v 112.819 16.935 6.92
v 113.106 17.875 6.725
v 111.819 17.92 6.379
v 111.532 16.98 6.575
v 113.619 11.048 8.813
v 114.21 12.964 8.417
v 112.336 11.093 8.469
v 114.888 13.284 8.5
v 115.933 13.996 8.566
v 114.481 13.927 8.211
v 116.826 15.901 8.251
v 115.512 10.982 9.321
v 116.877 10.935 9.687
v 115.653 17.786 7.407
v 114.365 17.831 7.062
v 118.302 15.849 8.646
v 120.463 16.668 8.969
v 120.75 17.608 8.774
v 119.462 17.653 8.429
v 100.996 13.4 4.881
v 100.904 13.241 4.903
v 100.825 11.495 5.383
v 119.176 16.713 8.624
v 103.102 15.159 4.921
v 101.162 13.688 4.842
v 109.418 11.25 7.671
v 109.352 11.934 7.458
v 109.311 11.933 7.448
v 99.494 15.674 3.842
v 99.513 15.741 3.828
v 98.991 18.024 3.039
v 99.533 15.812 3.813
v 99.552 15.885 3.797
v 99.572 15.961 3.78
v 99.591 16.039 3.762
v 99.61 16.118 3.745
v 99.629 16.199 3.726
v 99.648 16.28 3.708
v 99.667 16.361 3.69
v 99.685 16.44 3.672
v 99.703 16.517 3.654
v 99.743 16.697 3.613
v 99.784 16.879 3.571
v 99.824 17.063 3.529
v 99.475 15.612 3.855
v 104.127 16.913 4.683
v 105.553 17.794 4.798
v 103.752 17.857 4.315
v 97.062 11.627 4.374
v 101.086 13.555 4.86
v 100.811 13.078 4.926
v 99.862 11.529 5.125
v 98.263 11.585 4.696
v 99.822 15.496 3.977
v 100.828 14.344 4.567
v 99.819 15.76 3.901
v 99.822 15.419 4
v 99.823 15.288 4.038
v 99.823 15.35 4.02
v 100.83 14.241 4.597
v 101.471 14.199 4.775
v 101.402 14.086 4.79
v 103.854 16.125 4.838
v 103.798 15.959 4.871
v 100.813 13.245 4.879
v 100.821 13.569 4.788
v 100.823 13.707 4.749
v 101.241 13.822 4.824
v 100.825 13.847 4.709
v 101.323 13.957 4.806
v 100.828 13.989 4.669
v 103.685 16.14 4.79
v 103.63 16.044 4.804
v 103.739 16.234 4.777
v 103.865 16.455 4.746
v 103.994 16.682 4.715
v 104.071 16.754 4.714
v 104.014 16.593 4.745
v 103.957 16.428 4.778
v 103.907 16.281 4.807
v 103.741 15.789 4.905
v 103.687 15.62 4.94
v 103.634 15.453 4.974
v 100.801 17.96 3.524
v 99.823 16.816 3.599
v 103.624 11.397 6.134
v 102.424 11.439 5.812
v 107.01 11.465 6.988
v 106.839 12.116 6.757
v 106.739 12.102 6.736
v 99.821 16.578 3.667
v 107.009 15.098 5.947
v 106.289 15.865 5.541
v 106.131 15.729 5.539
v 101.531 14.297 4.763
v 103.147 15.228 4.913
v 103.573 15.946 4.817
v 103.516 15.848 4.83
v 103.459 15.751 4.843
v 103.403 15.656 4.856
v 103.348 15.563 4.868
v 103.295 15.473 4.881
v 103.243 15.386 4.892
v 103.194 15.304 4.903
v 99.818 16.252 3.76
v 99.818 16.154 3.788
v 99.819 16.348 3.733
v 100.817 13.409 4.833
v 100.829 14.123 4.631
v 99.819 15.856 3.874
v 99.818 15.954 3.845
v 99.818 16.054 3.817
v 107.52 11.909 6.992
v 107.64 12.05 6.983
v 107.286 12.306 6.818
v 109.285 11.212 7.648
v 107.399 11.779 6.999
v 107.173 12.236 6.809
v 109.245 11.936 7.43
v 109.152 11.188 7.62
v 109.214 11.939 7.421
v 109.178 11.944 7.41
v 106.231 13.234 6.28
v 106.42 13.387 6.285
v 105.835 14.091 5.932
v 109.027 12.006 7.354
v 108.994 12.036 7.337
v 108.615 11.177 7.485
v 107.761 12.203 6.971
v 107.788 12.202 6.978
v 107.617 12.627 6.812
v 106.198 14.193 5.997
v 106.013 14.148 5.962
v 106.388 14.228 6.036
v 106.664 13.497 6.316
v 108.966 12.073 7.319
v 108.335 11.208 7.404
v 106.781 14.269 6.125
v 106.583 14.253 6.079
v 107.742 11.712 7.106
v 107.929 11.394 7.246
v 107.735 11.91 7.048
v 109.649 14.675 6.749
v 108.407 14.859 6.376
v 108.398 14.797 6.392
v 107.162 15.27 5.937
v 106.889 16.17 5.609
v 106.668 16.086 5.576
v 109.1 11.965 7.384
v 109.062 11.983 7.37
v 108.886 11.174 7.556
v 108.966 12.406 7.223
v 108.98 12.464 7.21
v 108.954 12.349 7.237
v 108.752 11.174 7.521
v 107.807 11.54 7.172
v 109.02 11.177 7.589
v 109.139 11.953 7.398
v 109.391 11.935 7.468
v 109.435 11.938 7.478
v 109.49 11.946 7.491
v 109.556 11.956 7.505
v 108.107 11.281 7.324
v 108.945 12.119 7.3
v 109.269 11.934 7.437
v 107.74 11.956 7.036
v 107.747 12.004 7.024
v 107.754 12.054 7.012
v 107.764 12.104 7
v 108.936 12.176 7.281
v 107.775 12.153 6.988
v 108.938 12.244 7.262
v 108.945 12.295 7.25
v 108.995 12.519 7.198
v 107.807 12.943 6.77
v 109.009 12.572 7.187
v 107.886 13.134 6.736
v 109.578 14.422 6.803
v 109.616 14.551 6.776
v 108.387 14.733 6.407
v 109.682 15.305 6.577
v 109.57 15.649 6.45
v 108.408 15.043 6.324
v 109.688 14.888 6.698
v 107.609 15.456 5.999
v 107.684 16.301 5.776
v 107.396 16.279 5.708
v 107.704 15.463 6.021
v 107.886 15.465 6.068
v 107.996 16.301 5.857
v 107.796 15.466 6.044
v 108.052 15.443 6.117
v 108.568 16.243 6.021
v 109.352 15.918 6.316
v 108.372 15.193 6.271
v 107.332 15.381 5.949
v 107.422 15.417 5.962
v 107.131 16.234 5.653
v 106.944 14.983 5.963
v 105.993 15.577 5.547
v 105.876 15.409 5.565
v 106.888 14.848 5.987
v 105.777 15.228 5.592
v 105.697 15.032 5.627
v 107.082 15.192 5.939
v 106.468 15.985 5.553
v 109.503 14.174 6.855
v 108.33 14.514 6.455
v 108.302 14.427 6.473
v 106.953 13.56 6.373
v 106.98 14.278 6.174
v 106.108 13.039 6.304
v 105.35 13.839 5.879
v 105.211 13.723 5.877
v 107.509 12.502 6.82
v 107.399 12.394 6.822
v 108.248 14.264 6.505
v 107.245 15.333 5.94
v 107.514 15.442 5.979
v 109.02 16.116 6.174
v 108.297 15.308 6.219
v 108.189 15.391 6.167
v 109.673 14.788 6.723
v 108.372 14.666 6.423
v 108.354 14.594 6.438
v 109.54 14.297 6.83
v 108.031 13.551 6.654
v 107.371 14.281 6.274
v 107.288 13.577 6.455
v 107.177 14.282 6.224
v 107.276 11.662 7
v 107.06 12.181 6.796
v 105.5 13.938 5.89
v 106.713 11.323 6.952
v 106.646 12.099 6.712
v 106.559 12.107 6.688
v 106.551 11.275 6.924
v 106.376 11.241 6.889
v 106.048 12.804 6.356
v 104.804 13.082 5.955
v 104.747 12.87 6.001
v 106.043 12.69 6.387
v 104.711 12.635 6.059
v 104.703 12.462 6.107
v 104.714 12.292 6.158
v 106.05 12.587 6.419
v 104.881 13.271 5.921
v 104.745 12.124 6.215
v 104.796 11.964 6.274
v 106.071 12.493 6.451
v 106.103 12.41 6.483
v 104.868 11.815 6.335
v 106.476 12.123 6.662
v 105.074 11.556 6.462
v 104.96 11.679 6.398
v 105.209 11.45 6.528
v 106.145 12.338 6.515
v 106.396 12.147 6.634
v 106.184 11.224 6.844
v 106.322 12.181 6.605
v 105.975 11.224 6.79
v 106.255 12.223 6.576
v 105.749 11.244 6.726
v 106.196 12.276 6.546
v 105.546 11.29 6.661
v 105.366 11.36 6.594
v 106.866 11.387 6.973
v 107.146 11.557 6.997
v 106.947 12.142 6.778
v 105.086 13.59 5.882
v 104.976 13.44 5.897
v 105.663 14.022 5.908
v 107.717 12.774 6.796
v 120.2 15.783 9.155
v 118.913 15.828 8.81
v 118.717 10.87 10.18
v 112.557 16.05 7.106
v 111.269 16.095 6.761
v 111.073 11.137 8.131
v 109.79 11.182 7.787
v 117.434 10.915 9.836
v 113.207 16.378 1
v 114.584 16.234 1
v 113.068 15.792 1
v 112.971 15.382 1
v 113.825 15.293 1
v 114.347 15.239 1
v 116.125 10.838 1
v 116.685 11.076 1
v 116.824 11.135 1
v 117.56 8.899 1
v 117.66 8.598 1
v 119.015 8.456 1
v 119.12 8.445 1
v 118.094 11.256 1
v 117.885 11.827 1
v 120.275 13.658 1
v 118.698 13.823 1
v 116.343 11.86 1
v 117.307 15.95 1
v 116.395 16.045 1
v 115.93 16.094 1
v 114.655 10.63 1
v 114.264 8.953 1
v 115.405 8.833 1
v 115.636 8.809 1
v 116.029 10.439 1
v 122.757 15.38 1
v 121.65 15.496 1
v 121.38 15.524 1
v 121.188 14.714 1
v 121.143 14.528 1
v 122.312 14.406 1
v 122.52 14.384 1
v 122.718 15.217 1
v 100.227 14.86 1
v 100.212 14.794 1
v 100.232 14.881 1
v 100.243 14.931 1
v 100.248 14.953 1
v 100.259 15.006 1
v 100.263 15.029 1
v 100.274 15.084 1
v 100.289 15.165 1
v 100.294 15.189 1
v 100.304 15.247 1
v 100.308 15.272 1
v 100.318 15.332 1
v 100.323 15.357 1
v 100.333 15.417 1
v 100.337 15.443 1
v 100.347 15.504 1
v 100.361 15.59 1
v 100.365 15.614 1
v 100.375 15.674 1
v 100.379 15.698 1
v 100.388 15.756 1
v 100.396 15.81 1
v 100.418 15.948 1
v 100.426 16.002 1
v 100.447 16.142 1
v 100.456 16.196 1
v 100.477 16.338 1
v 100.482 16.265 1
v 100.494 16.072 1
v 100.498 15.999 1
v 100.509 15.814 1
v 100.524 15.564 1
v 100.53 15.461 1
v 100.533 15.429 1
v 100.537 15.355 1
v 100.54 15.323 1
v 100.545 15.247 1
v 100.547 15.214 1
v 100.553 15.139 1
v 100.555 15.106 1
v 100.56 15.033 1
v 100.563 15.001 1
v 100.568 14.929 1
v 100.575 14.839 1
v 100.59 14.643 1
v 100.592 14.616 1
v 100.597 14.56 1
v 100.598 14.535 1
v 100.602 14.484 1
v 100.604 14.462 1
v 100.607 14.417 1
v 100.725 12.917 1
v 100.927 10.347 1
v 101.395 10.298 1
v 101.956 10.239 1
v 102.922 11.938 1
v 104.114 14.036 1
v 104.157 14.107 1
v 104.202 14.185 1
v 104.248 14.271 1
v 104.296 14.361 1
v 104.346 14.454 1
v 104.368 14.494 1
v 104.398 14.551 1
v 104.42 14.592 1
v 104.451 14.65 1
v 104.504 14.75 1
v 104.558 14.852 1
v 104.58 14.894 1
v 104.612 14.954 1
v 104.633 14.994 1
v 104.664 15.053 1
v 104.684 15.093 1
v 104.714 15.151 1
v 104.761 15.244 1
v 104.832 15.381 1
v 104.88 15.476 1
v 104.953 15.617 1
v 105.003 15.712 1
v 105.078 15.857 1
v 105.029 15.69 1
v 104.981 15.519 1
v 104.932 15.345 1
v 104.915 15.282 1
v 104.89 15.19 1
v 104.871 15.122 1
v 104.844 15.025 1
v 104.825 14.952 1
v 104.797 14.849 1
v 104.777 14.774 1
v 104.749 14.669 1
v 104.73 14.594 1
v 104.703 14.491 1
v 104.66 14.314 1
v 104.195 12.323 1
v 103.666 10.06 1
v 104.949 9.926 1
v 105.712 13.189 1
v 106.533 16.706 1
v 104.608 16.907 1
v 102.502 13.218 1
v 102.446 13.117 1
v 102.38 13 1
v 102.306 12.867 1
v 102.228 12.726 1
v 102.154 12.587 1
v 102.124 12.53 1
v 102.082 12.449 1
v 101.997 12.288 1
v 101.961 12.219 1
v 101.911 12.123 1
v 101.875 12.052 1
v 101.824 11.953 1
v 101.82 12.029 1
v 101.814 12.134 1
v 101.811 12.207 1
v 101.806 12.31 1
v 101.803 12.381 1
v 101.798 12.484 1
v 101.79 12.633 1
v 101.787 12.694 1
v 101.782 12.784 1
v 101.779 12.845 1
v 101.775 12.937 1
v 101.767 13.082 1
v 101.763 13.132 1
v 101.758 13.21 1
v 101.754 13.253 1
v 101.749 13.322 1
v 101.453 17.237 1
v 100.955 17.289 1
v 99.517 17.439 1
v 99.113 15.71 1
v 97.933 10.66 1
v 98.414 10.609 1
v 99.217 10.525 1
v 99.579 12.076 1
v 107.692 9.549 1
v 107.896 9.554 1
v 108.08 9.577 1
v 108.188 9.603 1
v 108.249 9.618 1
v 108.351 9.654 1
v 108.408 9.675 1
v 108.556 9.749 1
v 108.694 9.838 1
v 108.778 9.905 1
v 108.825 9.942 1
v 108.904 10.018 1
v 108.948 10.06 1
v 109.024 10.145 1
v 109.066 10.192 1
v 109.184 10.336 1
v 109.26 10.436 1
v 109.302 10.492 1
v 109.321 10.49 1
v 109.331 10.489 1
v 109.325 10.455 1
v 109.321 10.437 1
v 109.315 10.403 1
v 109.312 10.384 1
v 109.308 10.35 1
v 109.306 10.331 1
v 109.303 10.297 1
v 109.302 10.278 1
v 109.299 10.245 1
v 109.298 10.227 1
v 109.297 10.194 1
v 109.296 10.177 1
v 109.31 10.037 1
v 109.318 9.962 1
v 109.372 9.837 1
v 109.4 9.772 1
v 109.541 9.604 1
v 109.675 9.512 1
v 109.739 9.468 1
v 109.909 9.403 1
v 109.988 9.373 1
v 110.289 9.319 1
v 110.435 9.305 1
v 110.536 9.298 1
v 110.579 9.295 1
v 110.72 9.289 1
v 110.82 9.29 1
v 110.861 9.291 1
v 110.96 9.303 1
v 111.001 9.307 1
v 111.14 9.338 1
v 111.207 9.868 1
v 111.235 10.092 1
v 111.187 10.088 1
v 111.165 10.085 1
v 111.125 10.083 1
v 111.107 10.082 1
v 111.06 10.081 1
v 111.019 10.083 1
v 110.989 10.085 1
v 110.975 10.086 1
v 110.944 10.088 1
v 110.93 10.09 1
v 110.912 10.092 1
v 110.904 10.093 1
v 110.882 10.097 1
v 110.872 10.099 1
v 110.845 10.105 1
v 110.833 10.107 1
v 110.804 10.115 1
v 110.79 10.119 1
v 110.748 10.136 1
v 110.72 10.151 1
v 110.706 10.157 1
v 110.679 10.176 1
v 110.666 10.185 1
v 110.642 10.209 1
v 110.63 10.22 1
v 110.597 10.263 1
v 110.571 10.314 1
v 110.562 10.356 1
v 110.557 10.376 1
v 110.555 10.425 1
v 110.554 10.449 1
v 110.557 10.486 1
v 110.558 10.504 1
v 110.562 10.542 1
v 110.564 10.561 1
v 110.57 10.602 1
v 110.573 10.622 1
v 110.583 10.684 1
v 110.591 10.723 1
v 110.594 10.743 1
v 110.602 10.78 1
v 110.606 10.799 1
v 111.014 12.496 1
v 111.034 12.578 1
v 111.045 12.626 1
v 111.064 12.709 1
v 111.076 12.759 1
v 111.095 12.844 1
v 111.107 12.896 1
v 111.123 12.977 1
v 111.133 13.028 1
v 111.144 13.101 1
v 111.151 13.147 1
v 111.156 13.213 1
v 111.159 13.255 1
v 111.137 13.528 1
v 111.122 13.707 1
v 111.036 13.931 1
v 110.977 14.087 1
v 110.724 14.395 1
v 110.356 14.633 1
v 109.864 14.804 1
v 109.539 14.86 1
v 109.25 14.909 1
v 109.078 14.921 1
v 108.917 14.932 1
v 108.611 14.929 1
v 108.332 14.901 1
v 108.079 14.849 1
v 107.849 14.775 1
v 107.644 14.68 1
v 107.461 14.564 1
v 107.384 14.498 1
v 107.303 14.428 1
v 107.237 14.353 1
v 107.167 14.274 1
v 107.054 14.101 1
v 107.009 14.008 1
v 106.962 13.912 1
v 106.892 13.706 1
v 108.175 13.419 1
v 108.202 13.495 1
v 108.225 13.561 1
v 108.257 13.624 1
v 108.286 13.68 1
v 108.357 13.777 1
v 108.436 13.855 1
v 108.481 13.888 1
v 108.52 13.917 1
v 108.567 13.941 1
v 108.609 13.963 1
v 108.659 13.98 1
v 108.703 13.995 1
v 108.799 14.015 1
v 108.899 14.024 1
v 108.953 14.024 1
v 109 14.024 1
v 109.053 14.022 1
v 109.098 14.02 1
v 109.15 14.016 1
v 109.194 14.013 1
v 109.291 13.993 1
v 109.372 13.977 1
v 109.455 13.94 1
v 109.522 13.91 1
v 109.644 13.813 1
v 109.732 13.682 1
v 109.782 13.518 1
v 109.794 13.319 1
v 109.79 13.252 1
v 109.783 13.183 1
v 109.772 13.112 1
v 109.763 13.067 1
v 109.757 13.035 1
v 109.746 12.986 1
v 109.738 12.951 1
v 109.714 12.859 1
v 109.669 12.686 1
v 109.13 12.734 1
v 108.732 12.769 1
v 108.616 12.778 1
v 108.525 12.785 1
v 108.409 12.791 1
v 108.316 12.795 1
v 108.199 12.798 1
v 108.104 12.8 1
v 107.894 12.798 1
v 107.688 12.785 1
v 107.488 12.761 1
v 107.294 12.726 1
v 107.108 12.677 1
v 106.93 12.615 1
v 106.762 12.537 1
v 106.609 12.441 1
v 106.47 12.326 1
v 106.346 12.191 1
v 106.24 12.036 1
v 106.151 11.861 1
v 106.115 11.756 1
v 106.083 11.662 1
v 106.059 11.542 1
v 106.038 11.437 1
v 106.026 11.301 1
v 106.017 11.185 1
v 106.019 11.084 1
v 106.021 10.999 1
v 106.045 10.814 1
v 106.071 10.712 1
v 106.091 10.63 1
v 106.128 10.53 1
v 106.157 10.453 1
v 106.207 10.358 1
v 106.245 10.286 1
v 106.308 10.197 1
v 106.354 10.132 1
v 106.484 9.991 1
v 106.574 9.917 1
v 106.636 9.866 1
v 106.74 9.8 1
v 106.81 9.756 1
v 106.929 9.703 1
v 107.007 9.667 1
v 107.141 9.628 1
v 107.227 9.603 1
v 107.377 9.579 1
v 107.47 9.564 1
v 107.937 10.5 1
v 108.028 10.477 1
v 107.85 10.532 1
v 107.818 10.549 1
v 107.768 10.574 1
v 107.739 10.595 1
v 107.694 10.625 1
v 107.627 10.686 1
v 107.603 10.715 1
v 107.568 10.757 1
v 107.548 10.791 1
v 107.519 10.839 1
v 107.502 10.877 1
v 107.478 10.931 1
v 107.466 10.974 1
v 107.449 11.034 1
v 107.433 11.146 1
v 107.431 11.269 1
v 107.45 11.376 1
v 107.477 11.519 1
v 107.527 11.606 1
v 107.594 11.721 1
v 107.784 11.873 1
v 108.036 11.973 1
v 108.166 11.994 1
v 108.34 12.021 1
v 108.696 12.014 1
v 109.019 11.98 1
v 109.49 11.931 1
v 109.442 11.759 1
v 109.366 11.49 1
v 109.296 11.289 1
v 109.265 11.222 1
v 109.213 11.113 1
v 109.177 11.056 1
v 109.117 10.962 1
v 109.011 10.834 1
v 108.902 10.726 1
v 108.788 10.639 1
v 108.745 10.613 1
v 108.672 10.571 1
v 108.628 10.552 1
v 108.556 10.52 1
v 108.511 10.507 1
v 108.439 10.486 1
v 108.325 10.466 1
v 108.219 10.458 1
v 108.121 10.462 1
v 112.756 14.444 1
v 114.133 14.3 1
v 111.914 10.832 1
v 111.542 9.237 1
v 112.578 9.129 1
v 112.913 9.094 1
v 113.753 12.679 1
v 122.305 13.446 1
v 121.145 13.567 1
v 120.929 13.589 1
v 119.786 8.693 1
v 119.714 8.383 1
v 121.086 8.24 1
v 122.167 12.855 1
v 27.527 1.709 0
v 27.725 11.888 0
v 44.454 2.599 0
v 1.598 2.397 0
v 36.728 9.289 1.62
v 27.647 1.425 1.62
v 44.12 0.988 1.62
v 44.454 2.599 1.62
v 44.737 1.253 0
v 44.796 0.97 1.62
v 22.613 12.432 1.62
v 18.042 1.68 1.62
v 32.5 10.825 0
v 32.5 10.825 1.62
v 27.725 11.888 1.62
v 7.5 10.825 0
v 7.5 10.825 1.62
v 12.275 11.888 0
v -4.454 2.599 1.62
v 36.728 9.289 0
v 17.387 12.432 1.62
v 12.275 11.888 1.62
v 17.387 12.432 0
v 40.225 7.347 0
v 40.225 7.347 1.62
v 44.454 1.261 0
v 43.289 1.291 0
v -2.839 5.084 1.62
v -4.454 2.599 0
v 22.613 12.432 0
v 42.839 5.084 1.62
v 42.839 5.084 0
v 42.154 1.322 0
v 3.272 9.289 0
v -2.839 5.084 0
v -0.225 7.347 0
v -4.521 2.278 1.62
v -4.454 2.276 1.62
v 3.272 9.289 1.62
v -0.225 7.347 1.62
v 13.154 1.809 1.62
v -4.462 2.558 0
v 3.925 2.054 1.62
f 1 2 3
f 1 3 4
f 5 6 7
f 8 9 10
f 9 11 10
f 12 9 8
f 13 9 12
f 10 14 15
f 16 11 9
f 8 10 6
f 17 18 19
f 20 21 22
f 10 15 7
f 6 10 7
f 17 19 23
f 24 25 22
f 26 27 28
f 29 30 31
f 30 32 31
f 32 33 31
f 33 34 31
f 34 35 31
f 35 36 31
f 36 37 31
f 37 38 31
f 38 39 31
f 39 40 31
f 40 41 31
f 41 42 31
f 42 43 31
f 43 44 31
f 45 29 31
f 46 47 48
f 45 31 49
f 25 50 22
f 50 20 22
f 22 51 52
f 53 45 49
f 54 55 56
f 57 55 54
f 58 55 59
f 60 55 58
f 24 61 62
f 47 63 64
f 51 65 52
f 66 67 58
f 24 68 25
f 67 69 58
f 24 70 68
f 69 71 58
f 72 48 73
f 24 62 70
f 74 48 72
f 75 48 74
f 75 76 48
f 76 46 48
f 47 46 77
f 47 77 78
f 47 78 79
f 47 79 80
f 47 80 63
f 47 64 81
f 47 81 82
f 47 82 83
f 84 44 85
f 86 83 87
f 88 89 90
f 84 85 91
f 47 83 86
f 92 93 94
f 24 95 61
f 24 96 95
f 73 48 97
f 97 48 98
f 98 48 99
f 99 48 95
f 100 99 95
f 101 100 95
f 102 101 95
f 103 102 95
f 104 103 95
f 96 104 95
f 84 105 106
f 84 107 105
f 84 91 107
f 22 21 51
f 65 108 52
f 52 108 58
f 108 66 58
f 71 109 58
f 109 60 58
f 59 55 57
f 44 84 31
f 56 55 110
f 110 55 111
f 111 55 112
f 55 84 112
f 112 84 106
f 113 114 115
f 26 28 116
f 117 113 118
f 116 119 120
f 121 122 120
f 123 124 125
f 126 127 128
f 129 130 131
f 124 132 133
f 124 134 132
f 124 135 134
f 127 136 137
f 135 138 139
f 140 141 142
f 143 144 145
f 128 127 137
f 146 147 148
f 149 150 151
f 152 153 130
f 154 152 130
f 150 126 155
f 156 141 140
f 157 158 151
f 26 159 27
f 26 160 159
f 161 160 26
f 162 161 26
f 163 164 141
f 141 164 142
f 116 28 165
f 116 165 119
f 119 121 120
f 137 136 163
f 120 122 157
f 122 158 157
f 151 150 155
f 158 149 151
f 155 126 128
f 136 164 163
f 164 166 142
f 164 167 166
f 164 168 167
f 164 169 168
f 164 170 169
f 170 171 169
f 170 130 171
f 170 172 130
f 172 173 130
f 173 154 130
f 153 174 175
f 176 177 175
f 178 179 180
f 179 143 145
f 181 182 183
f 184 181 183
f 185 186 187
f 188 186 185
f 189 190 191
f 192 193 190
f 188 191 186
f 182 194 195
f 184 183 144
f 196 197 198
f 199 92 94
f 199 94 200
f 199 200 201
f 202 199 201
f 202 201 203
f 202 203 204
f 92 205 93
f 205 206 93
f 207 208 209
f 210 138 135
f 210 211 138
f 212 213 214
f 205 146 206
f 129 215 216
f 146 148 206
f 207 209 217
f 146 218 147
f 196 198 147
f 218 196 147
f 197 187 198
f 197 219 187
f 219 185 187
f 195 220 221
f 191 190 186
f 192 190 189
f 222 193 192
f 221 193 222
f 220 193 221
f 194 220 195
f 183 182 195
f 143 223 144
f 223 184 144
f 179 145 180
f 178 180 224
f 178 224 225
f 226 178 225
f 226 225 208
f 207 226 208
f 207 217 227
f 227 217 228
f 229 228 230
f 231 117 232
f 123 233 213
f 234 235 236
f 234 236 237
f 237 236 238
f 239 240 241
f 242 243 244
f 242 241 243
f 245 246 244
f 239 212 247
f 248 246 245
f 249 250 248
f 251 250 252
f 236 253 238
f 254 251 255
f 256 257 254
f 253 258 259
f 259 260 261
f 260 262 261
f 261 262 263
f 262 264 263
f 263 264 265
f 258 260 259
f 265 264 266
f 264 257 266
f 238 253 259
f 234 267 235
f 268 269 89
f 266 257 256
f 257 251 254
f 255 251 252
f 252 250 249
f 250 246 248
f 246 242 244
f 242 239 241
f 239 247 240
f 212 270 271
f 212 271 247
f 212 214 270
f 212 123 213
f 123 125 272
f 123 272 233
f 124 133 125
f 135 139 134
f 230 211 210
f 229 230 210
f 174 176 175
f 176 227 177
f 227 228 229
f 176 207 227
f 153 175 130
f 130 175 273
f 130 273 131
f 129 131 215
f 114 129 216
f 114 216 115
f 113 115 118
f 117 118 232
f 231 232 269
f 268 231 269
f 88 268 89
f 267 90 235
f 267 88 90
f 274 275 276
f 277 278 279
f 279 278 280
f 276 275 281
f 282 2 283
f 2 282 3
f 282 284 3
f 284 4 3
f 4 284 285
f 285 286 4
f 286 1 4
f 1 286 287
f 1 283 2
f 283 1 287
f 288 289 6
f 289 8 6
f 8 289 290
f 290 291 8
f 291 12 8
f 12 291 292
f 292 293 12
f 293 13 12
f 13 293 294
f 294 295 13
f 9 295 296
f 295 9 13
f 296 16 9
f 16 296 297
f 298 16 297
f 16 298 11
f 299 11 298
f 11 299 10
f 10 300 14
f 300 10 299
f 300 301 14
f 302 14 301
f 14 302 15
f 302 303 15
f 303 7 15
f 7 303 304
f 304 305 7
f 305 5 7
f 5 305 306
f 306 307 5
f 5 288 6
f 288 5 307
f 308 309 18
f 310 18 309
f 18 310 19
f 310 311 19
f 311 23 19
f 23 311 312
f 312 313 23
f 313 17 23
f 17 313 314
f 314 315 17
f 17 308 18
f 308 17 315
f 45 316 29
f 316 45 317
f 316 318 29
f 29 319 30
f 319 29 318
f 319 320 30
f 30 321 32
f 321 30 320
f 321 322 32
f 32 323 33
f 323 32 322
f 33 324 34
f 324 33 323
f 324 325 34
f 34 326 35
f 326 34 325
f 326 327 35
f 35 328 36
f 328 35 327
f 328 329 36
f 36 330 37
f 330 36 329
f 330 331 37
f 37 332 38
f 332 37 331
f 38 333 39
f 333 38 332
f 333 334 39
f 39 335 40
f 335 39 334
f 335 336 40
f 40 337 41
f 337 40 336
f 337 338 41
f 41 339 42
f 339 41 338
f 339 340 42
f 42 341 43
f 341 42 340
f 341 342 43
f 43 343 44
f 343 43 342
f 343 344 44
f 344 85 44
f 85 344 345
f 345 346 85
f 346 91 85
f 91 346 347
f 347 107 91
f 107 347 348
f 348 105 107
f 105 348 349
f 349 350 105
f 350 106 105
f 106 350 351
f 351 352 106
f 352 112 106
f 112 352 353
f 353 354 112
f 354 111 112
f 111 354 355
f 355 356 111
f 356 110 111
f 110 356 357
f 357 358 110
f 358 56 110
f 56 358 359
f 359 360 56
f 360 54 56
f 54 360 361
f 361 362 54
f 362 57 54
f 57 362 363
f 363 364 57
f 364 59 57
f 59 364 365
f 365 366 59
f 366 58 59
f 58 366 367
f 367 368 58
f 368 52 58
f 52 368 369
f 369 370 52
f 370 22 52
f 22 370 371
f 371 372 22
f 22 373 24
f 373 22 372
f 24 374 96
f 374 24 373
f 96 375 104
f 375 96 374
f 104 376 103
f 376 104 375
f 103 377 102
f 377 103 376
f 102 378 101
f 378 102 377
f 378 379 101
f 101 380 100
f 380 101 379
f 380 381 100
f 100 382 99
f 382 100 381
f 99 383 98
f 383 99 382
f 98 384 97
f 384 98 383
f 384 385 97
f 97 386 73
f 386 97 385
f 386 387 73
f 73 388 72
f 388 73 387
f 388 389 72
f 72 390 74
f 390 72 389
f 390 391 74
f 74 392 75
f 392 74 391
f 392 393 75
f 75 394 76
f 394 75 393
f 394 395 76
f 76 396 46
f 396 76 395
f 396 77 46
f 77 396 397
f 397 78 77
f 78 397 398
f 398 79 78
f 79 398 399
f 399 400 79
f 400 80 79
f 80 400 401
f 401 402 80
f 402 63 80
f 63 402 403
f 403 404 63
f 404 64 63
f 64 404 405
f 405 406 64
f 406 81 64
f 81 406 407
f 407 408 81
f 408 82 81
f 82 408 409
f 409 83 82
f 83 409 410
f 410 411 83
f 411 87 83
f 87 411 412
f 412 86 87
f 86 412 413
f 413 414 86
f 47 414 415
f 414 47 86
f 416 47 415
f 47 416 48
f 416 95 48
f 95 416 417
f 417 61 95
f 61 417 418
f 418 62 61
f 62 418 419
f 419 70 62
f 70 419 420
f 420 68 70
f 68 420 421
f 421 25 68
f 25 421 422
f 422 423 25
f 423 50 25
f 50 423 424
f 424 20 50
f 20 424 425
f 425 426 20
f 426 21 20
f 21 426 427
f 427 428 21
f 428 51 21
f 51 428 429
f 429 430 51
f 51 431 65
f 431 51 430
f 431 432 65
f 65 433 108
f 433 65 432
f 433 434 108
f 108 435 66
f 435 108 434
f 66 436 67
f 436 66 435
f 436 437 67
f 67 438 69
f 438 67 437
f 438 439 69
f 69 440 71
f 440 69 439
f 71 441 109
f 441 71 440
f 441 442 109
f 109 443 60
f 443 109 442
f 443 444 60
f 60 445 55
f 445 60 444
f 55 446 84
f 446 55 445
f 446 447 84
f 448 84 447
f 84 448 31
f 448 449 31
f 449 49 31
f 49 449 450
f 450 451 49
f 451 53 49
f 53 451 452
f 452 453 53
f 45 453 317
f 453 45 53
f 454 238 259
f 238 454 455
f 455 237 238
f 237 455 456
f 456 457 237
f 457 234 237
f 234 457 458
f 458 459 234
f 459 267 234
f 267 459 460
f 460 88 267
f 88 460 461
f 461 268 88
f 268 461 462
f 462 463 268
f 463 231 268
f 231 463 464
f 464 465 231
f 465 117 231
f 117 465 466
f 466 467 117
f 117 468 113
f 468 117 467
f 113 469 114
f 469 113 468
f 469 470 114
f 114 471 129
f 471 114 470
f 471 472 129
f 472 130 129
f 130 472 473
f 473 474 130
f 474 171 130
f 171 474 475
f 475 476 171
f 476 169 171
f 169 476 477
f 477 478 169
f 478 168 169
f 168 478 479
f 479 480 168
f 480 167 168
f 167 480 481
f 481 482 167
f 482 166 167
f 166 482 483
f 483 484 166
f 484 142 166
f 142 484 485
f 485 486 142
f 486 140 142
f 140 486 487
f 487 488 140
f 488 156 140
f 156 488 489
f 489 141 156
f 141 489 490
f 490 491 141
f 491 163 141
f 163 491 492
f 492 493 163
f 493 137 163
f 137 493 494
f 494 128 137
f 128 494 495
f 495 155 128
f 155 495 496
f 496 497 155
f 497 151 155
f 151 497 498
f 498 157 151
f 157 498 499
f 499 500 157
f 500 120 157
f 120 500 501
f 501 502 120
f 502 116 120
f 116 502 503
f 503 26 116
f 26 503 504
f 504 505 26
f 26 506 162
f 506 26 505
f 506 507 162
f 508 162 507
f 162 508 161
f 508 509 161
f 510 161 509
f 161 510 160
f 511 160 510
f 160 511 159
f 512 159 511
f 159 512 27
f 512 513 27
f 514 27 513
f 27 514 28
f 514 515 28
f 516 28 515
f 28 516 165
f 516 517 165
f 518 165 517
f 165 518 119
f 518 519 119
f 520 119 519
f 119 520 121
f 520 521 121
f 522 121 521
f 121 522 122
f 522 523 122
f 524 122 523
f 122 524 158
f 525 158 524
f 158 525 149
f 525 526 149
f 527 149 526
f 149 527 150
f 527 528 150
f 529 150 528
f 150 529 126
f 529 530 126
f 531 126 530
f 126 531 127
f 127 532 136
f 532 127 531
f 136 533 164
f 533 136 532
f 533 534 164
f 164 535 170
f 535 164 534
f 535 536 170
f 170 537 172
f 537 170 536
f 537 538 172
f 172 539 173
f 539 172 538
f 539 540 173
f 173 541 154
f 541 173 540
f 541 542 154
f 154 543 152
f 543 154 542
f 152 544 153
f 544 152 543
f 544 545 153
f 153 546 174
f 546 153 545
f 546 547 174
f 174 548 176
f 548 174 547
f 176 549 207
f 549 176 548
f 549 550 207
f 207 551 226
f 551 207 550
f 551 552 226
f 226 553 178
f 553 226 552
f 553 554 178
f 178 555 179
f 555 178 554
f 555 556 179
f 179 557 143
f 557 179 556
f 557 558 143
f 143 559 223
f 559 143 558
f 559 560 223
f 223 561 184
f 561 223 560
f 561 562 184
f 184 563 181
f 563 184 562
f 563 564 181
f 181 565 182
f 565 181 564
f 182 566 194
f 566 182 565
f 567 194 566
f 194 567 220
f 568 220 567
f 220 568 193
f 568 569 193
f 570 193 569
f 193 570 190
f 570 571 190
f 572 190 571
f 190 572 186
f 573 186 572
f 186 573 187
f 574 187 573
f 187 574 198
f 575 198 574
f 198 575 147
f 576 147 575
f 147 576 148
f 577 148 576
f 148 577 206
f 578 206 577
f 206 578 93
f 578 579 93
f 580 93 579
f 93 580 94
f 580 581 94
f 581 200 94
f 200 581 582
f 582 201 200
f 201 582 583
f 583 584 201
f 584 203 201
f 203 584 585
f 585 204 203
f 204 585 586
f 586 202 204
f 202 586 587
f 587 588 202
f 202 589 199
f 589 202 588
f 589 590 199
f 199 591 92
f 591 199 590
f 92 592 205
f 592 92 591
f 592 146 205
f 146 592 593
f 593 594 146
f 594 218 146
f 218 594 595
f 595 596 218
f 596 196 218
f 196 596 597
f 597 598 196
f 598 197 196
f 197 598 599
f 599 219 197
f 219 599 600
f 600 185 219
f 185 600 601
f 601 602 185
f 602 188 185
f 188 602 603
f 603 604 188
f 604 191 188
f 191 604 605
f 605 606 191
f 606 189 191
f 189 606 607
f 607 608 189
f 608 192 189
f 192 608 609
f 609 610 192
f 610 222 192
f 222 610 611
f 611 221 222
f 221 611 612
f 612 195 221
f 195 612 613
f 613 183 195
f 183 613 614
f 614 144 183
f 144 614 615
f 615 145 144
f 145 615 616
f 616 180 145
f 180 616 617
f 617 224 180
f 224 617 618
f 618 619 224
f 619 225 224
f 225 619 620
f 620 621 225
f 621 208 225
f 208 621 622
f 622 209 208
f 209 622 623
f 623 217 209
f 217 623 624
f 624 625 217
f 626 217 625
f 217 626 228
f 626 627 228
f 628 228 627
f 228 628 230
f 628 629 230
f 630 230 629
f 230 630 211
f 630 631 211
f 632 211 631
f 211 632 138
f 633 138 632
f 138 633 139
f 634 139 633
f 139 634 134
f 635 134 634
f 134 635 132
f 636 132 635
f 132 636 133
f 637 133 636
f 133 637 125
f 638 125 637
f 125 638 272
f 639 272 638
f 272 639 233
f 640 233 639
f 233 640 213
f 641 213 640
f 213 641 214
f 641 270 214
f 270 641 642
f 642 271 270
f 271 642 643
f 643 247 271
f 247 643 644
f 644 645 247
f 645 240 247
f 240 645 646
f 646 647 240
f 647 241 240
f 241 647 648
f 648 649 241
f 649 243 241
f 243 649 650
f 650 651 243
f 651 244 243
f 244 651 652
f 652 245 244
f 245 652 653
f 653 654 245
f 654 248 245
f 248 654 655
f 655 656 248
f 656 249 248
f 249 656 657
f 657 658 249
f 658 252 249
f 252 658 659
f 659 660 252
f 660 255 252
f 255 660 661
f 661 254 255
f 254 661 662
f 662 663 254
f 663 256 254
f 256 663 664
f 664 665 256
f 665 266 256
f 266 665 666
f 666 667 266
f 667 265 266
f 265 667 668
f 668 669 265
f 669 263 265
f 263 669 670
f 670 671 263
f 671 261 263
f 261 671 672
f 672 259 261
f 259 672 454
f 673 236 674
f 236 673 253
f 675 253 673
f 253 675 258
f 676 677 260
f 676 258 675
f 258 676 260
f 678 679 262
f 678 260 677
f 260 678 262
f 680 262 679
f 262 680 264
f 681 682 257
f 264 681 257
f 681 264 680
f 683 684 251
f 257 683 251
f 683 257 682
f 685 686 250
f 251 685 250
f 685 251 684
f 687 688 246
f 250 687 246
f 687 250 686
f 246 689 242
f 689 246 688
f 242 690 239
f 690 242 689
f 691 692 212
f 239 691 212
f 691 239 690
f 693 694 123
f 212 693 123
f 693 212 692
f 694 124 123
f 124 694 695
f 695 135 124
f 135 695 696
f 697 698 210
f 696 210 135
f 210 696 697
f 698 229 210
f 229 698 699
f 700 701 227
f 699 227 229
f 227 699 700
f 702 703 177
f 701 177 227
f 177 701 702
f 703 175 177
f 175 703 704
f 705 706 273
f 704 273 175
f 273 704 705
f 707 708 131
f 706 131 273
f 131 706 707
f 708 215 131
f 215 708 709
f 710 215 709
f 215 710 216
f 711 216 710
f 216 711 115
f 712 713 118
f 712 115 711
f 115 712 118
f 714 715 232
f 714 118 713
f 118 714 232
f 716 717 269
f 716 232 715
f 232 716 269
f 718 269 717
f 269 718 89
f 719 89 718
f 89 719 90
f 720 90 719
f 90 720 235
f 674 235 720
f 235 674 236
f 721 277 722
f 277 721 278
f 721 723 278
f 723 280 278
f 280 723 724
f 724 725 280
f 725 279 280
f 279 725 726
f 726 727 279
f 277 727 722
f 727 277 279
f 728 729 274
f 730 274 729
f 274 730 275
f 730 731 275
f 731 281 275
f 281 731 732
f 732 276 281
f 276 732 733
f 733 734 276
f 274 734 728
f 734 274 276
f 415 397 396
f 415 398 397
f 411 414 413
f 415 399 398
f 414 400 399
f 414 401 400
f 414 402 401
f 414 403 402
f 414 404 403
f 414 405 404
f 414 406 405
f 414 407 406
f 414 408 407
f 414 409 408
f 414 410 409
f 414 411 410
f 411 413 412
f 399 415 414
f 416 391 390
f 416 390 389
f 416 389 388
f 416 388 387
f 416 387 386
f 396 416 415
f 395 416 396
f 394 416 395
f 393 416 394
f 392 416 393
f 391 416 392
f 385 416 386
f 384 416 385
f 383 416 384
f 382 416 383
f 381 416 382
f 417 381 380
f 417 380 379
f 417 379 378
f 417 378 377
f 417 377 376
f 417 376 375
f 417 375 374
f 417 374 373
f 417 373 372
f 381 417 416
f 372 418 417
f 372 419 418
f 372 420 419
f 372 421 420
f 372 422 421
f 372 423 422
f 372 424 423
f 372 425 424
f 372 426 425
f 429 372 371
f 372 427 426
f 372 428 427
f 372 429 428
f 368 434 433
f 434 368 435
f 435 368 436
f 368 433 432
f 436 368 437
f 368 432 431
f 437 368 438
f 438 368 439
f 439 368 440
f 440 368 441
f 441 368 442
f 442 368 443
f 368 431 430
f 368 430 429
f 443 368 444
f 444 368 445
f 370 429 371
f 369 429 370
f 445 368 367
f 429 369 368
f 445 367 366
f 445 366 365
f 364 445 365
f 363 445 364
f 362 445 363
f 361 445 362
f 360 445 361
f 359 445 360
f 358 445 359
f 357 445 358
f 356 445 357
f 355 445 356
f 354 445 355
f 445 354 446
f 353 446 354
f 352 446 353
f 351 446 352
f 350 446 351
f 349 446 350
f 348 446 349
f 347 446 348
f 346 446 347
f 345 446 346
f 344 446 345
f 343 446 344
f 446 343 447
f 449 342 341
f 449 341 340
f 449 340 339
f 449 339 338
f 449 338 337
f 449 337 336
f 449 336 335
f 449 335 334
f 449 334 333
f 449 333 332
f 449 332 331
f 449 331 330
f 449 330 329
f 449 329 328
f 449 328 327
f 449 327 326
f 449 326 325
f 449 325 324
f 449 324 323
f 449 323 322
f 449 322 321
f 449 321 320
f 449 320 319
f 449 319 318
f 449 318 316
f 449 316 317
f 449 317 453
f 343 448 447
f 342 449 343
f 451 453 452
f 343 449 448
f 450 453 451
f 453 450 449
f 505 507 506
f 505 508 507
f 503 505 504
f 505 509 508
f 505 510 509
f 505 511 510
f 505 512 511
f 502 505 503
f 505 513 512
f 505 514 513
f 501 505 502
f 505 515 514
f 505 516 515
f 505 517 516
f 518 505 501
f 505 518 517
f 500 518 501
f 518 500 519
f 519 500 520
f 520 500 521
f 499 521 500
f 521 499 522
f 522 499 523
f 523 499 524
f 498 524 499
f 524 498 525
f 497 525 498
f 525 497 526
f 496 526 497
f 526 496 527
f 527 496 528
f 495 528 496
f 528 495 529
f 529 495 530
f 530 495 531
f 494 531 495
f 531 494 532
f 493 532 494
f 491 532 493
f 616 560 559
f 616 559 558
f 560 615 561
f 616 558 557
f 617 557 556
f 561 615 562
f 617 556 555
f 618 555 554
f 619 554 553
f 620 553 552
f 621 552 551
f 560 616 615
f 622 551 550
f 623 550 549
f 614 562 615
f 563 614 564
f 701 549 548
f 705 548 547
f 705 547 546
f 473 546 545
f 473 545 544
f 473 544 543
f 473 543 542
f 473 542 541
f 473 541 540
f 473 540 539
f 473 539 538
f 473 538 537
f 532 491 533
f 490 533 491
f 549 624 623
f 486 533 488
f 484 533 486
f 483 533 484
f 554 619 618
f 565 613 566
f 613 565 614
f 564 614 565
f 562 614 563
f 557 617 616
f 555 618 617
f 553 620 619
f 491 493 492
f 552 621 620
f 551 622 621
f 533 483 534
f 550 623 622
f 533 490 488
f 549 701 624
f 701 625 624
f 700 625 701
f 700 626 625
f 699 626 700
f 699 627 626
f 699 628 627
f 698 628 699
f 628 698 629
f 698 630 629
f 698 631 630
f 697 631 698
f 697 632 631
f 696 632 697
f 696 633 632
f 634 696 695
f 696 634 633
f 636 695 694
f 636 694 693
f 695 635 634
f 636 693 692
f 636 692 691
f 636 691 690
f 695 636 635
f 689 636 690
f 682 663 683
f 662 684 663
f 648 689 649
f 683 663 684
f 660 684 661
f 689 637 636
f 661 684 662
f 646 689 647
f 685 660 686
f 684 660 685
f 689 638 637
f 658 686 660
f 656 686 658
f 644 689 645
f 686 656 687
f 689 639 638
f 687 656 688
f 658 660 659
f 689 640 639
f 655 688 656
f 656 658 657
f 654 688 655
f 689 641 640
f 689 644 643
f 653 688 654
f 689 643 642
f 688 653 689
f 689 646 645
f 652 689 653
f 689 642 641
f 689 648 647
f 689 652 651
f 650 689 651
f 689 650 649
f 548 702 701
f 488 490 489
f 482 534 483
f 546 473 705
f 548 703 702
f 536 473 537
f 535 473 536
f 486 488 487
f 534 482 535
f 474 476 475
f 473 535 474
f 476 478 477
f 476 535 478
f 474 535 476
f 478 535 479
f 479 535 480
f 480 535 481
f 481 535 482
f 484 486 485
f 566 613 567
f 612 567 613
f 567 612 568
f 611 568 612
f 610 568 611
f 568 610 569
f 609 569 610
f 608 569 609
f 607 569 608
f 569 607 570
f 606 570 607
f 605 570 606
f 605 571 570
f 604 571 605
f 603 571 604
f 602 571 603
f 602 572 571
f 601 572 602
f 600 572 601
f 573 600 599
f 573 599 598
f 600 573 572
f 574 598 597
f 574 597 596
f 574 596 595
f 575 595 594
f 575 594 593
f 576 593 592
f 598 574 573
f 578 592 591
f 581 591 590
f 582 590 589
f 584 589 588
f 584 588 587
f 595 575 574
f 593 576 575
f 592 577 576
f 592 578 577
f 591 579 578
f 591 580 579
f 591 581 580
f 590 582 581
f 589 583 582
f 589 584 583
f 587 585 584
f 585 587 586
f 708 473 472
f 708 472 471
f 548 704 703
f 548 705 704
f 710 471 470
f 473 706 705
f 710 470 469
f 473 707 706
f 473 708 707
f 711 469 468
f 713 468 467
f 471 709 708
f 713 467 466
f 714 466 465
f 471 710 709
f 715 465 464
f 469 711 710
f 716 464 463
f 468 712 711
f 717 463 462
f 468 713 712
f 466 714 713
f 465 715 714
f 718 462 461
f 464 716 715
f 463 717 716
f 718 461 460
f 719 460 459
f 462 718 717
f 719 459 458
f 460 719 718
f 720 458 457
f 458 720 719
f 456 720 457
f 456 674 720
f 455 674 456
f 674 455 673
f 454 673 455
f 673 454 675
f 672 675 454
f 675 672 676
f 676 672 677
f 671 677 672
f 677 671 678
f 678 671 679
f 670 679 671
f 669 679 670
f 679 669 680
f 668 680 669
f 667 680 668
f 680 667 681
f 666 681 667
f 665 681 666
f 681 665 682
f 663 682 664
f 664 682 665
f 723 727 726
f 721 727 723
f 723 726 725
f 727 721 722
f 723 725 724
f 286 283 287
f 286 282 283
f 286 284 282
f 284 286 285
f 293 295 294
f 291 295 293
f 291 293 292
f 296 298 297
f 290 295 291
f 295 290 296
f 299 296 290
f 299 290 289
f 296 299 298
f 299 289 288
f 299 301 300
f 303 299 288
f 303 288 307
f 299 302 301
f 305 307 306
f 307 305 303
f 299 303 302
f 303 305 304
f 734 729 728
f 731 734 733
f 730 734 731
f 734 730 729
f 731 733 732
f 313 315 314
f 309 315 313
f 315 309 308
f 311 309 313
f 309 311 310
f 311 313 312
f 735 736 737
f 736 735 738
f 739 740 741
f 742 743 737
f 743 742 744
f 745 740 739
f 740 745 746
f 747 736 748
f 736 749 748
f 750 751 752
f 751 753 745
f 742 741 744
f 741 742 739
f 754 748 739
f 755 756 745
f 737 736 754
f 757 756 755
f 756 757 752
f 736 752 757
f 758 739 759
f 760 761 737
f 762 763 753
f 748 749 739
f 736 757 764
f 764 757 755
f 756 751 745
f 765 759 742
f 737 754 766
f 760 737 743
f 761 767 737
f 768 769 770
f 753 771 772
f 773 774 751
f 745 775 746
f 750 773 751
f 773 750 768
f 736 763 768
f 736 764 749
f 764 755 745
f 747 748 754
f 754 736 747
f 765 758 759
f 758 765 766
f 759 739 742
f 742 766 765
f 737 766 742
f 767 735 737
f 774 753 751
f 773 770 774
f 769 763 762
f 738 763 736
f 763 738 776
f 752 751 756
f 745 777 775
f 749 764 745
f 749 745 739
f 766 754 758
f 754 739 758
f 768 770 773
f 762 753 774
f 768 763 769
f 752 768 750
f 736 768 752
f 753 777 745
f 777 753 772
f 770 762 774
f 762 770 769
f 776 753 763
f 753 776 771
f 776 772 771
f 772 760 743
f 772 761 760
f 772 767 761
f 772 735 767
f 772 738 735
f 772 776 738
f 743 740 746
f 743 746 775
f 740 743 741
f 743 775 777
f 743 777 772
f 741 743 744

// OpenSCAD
LH = 0.36;  //Layer height
COLORS = 8;  //Levels of gray
WIDTH = 141.13;
DEPTH = LH*(COLORS+1);

TOL = 0.4;

ANGLE=30;  // Inclination of the whole figure


f_scale = WIDTH/532;

module _table(){
    color("sienna"){
        rotate([ANGLE, 0, 0])
        translate([0,-13,-150])
        cube([200,20,300]);
    }
}

module letters(txt){
    difference(){
        translate([94,0,-5])
        rotate([-15,-15,-2])
        linear_extrude(height=10)
        text(txt, size=7, font = "Liberation Sans:style=Bold Italic");
        translate([0,-50,-199])cube(200);
    }
}

module support(depth){
    translate([71, 13, -12])
    rotate([0,70,0])
    rotate([0,0,30])
    scale([2,1.,1])
    cylinder(d=25, h=depth, center=true);
}

module figure(depth_base){
    translate([0,1,0])
    union(){
        // Litophane
        translate([0,0,LH/2])
        intersection(){  
            scale([f_scale,f_scale,LH*COLORS/100])
            surface("resources/surface.png");
            translate([20*f_scale,30*f_scale,0])
            linear_extrude(height=50)
            offset(r=1)
            import ("resources/shape.dxf");
        }
        // Outer shell
        translate([20*f_scale,30*f_scale,0])
        union(){
            linear_extrude(height=depth_base) // Base
            difference(){
                offset(r=1)
                import ("resources/base.dxf");
                import ("resources/shape.dxf");
            }
            linear_extrude(height=LH) // Fill
            offset(r=.5)
            import ("shape.dxf");
            linear_extrude(height=DEPTH) //Wall
            difference(){
                offset(r=1)
                import ("resources/shape.dxf");
                import ("resources/shape.dxf");
            }
            
            letters("Maiki");
        }        
    }
    
}

module view_all(){
    rotate([-ANGLE+90,0,0]){
        color("white", 1){
            figure(DEPTH/2);
            support(DEPTH/2);
        }
        _table();
    }
}


module final_pieces(){

    difference(){
        figure(DEPTH/2);
        translate([0,-25/4,0]) support(DEPTH/2+TOL);
        _table();
    }      
   
    translate([20,0, DEPTH/4])
    rotate([0,-70,-30])
    translate([-71, -13, 12])
    difference(){
        support(DEPTH/2);
        translate([0,+25/4,0]) figure(DEPTH/2+TOL);
        _table();

    }
}

//view_all();
final_pieces();
